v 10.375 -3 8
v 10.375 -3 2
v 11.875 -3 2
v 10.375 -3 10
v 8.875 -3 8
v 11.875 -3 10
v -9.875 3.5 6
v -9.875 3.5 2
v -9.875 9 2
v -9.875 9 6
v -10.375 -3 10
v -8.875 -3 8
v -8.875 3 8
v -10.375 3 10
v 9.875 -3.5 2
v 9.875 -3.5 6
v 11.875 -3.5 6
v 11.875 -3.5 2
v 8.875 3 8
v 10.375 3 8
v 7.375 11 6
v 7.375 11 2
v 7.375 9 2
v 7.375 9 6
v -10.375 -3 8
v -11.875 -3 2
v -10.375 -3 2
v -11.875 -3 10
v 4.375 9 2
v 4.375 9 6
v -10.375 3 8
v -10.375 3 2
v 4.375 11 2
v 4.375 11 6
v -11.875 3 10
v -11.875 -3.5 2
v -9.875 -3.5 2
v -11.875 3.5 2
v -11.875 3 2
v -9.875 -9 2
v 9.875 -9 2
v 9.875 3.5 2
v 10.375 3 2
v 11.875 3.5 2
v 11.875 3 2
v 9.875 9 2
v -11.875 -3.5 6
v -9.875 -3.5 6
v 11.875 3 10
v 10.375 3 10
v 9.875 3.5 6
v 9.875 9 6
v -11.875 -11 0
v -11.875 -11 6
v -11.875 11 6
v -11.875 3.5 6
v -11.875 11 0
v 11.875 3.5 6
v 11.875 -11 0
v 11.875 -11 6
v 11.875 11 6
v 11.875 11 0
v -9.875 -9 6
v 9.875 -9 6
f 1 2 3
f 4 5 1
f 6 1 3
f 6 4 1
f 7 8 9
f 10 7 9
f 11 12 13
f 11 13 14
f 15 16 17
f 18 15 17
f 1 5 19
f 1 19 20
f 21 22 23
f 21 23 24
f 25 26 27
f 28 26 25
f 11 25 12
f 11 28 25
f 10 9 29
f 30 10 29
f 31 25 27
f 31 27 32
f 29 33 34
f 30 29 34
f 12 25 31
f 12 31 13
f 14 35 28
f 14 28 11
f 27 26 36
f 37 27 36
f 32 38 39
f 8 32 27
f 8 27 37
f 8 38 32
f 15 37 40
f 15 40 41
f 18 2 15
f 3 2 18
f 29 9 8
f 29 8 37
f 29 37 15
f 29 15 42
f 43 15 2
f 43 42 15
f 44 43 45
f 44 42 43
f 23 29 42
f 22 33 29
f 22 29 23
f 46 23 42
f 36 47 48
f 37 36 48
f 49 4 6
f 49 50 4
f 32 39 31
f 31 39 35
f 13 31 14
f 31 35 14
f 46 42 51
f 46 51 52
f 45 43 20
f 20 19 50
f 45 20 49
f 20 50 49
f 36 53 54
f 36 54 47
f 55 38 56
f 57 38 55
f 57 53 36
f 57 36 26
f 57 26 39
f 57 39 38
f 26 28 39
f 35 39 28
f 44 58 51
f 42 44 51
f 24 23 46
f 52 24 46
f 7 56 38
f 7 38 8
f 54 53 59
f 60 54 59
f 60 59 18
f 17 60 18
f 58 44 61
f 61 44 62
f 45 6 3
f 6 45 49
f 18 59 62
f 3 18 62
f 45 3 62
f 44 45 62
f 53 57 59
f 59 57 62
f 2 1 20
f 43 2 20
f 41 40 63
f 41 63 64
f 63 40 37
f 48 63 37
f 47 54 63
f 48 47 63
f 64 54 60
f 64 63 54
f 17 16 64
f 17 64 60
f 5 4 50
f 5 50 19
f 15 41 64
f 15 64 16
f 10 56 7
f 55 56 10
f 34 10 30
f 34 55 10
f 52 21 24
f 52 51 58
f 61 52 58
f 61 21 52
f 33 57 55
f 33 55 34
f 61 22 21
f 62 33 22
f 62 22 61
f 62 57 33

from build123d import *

# Parameters (mm, degrees)
F0_W      = 23.75
F0_H      = 22
F0_W_2    = 19.75
F0_H_2    = 18
F1_DEPTH  = 2
F2_DEPTH  = 6
F3_W      = 2
F3_H      = 0.5
F4_DEPTH  = 4
F5_DEPTH  = 4
F7_DEPTH  = 6
F8_W      = 3
F8_H      = 4
F9_DEPTH  = 5.2
F10_W     = 0.5
F10_H     = 6
F11_DEPTH = 8
F12_W     = 0.5
F12_H     = 6
F13_DEPTH = 8
F15_DEPTH = 6
F17_DEPTH = 6


# Not quite as in the source:
# - a feature names something its author has since deleted; it is built from what else it names


with BuildPart() as f1:
    # F0 (on Top) → F1 (new body)
    with BuildSketch(Plane.XY):
        Rectangle(F0_W, F0_H)
        Rectangle(F0_W_2, F0_H_2, mode=Mode.SUBTRACT)
        Rectangle(F0_W_2, F0_H_2)
    extrude(amount=F1_DEPTH)

    # F0 (on Top) → F2 (join)
    with BuildSketch(Plane.XY):
        Rectangle(F0_W, F0_H)
        Rectangle(F0_W_2, F0_H_2, mode=Mode.SUBTRACT)
    extrude(amount=F2_DEPTH)

    # F3 (on face) → F4 (cut)
    with BuildSketch(Plane.XY.offset(6)):
        Polygon((10.875, -3), (9.875, -3), (9.875, -3.5), (11.875, -3.5), (11.875, -3), align=None)
        Polygon((9.875, 3.5), (9.875, 3), (10.875, 3), (11.875, 3), (11.875, 3.5), align=None)
        with Locations((-10.875, 3.25)):
            Rectangle(F3_W, F3_H)
        with Locations((-10.875, -3.25)):
            Rectangle(F3_W, F3_H)
    extrude(amount=-F4_DEPTH, mode=Mode.SUBTRACT)

    # F5 (add): faces of the model
    f5_faces = [f1.faces().sort_by_distance(p)[0] for p in [
        (10.875, 0, 6),
        (-10.875, 0, 6),
    ]]
    extrude(f5_faces, amount=F5_DEPTH)

    # F6 (on face) → F7 (join)
    with BuildSketch(Plane.XZ.offset(3)):
        Polygon((11.875, 8), (11.875, 10), (10.375, 8), align=None)
    extrude(amount=-F7_DEPTH)

    # F8 (on face) → F9 (cut)
    with BuildSketch(Plane(origin=(0, 11, 0), x_dir=(-1, 0, 0), z_dir=(0, 1, 0))):
        with Locations((-5.875, 4)):
            Rectangle(F8_W, F8_H)
    extrude(amount=-F9_DEPTH, mode=Mode.SUBTRACT)

    # F10 (on face) → F11 (cut)
    with BuildSketch(Plane.XY.offset(10)):
        with Locations((-10.125, 0)):
            Rectangle(F10_W, F10_H)
    extrude(amount=-F11_DEPTH, mode=Mode.SUBTRACT)

    # F12 (on face) → F13 (cut)
    with BuildSketch(Plane.XY.offset(10)):
        with Locations((10.125, 0)):
            Rectangle(F12_W, F12_H)
    extrude(amount=-F13_DEPTH, mode=Mode.SUBTRACT)

    # F14 (on face) → F15 (join)
    with BuildSketch(Plane.XZ.offset(3)):
        Polygon((10.375, 8), (10.375, 10), (8.875, 8), align=None)
    extrude(amount=-F15_DEPTH)

    # F16 (on face) → F17 (join)
    with BuildSketch(Plane.XZ.offset(3)):
        Polygon((-8.875, 8), (-10.375, 10), (-10.375, 8), align=None)
    extrude(amount=-F17_DEPTH)


solid = f1.part
